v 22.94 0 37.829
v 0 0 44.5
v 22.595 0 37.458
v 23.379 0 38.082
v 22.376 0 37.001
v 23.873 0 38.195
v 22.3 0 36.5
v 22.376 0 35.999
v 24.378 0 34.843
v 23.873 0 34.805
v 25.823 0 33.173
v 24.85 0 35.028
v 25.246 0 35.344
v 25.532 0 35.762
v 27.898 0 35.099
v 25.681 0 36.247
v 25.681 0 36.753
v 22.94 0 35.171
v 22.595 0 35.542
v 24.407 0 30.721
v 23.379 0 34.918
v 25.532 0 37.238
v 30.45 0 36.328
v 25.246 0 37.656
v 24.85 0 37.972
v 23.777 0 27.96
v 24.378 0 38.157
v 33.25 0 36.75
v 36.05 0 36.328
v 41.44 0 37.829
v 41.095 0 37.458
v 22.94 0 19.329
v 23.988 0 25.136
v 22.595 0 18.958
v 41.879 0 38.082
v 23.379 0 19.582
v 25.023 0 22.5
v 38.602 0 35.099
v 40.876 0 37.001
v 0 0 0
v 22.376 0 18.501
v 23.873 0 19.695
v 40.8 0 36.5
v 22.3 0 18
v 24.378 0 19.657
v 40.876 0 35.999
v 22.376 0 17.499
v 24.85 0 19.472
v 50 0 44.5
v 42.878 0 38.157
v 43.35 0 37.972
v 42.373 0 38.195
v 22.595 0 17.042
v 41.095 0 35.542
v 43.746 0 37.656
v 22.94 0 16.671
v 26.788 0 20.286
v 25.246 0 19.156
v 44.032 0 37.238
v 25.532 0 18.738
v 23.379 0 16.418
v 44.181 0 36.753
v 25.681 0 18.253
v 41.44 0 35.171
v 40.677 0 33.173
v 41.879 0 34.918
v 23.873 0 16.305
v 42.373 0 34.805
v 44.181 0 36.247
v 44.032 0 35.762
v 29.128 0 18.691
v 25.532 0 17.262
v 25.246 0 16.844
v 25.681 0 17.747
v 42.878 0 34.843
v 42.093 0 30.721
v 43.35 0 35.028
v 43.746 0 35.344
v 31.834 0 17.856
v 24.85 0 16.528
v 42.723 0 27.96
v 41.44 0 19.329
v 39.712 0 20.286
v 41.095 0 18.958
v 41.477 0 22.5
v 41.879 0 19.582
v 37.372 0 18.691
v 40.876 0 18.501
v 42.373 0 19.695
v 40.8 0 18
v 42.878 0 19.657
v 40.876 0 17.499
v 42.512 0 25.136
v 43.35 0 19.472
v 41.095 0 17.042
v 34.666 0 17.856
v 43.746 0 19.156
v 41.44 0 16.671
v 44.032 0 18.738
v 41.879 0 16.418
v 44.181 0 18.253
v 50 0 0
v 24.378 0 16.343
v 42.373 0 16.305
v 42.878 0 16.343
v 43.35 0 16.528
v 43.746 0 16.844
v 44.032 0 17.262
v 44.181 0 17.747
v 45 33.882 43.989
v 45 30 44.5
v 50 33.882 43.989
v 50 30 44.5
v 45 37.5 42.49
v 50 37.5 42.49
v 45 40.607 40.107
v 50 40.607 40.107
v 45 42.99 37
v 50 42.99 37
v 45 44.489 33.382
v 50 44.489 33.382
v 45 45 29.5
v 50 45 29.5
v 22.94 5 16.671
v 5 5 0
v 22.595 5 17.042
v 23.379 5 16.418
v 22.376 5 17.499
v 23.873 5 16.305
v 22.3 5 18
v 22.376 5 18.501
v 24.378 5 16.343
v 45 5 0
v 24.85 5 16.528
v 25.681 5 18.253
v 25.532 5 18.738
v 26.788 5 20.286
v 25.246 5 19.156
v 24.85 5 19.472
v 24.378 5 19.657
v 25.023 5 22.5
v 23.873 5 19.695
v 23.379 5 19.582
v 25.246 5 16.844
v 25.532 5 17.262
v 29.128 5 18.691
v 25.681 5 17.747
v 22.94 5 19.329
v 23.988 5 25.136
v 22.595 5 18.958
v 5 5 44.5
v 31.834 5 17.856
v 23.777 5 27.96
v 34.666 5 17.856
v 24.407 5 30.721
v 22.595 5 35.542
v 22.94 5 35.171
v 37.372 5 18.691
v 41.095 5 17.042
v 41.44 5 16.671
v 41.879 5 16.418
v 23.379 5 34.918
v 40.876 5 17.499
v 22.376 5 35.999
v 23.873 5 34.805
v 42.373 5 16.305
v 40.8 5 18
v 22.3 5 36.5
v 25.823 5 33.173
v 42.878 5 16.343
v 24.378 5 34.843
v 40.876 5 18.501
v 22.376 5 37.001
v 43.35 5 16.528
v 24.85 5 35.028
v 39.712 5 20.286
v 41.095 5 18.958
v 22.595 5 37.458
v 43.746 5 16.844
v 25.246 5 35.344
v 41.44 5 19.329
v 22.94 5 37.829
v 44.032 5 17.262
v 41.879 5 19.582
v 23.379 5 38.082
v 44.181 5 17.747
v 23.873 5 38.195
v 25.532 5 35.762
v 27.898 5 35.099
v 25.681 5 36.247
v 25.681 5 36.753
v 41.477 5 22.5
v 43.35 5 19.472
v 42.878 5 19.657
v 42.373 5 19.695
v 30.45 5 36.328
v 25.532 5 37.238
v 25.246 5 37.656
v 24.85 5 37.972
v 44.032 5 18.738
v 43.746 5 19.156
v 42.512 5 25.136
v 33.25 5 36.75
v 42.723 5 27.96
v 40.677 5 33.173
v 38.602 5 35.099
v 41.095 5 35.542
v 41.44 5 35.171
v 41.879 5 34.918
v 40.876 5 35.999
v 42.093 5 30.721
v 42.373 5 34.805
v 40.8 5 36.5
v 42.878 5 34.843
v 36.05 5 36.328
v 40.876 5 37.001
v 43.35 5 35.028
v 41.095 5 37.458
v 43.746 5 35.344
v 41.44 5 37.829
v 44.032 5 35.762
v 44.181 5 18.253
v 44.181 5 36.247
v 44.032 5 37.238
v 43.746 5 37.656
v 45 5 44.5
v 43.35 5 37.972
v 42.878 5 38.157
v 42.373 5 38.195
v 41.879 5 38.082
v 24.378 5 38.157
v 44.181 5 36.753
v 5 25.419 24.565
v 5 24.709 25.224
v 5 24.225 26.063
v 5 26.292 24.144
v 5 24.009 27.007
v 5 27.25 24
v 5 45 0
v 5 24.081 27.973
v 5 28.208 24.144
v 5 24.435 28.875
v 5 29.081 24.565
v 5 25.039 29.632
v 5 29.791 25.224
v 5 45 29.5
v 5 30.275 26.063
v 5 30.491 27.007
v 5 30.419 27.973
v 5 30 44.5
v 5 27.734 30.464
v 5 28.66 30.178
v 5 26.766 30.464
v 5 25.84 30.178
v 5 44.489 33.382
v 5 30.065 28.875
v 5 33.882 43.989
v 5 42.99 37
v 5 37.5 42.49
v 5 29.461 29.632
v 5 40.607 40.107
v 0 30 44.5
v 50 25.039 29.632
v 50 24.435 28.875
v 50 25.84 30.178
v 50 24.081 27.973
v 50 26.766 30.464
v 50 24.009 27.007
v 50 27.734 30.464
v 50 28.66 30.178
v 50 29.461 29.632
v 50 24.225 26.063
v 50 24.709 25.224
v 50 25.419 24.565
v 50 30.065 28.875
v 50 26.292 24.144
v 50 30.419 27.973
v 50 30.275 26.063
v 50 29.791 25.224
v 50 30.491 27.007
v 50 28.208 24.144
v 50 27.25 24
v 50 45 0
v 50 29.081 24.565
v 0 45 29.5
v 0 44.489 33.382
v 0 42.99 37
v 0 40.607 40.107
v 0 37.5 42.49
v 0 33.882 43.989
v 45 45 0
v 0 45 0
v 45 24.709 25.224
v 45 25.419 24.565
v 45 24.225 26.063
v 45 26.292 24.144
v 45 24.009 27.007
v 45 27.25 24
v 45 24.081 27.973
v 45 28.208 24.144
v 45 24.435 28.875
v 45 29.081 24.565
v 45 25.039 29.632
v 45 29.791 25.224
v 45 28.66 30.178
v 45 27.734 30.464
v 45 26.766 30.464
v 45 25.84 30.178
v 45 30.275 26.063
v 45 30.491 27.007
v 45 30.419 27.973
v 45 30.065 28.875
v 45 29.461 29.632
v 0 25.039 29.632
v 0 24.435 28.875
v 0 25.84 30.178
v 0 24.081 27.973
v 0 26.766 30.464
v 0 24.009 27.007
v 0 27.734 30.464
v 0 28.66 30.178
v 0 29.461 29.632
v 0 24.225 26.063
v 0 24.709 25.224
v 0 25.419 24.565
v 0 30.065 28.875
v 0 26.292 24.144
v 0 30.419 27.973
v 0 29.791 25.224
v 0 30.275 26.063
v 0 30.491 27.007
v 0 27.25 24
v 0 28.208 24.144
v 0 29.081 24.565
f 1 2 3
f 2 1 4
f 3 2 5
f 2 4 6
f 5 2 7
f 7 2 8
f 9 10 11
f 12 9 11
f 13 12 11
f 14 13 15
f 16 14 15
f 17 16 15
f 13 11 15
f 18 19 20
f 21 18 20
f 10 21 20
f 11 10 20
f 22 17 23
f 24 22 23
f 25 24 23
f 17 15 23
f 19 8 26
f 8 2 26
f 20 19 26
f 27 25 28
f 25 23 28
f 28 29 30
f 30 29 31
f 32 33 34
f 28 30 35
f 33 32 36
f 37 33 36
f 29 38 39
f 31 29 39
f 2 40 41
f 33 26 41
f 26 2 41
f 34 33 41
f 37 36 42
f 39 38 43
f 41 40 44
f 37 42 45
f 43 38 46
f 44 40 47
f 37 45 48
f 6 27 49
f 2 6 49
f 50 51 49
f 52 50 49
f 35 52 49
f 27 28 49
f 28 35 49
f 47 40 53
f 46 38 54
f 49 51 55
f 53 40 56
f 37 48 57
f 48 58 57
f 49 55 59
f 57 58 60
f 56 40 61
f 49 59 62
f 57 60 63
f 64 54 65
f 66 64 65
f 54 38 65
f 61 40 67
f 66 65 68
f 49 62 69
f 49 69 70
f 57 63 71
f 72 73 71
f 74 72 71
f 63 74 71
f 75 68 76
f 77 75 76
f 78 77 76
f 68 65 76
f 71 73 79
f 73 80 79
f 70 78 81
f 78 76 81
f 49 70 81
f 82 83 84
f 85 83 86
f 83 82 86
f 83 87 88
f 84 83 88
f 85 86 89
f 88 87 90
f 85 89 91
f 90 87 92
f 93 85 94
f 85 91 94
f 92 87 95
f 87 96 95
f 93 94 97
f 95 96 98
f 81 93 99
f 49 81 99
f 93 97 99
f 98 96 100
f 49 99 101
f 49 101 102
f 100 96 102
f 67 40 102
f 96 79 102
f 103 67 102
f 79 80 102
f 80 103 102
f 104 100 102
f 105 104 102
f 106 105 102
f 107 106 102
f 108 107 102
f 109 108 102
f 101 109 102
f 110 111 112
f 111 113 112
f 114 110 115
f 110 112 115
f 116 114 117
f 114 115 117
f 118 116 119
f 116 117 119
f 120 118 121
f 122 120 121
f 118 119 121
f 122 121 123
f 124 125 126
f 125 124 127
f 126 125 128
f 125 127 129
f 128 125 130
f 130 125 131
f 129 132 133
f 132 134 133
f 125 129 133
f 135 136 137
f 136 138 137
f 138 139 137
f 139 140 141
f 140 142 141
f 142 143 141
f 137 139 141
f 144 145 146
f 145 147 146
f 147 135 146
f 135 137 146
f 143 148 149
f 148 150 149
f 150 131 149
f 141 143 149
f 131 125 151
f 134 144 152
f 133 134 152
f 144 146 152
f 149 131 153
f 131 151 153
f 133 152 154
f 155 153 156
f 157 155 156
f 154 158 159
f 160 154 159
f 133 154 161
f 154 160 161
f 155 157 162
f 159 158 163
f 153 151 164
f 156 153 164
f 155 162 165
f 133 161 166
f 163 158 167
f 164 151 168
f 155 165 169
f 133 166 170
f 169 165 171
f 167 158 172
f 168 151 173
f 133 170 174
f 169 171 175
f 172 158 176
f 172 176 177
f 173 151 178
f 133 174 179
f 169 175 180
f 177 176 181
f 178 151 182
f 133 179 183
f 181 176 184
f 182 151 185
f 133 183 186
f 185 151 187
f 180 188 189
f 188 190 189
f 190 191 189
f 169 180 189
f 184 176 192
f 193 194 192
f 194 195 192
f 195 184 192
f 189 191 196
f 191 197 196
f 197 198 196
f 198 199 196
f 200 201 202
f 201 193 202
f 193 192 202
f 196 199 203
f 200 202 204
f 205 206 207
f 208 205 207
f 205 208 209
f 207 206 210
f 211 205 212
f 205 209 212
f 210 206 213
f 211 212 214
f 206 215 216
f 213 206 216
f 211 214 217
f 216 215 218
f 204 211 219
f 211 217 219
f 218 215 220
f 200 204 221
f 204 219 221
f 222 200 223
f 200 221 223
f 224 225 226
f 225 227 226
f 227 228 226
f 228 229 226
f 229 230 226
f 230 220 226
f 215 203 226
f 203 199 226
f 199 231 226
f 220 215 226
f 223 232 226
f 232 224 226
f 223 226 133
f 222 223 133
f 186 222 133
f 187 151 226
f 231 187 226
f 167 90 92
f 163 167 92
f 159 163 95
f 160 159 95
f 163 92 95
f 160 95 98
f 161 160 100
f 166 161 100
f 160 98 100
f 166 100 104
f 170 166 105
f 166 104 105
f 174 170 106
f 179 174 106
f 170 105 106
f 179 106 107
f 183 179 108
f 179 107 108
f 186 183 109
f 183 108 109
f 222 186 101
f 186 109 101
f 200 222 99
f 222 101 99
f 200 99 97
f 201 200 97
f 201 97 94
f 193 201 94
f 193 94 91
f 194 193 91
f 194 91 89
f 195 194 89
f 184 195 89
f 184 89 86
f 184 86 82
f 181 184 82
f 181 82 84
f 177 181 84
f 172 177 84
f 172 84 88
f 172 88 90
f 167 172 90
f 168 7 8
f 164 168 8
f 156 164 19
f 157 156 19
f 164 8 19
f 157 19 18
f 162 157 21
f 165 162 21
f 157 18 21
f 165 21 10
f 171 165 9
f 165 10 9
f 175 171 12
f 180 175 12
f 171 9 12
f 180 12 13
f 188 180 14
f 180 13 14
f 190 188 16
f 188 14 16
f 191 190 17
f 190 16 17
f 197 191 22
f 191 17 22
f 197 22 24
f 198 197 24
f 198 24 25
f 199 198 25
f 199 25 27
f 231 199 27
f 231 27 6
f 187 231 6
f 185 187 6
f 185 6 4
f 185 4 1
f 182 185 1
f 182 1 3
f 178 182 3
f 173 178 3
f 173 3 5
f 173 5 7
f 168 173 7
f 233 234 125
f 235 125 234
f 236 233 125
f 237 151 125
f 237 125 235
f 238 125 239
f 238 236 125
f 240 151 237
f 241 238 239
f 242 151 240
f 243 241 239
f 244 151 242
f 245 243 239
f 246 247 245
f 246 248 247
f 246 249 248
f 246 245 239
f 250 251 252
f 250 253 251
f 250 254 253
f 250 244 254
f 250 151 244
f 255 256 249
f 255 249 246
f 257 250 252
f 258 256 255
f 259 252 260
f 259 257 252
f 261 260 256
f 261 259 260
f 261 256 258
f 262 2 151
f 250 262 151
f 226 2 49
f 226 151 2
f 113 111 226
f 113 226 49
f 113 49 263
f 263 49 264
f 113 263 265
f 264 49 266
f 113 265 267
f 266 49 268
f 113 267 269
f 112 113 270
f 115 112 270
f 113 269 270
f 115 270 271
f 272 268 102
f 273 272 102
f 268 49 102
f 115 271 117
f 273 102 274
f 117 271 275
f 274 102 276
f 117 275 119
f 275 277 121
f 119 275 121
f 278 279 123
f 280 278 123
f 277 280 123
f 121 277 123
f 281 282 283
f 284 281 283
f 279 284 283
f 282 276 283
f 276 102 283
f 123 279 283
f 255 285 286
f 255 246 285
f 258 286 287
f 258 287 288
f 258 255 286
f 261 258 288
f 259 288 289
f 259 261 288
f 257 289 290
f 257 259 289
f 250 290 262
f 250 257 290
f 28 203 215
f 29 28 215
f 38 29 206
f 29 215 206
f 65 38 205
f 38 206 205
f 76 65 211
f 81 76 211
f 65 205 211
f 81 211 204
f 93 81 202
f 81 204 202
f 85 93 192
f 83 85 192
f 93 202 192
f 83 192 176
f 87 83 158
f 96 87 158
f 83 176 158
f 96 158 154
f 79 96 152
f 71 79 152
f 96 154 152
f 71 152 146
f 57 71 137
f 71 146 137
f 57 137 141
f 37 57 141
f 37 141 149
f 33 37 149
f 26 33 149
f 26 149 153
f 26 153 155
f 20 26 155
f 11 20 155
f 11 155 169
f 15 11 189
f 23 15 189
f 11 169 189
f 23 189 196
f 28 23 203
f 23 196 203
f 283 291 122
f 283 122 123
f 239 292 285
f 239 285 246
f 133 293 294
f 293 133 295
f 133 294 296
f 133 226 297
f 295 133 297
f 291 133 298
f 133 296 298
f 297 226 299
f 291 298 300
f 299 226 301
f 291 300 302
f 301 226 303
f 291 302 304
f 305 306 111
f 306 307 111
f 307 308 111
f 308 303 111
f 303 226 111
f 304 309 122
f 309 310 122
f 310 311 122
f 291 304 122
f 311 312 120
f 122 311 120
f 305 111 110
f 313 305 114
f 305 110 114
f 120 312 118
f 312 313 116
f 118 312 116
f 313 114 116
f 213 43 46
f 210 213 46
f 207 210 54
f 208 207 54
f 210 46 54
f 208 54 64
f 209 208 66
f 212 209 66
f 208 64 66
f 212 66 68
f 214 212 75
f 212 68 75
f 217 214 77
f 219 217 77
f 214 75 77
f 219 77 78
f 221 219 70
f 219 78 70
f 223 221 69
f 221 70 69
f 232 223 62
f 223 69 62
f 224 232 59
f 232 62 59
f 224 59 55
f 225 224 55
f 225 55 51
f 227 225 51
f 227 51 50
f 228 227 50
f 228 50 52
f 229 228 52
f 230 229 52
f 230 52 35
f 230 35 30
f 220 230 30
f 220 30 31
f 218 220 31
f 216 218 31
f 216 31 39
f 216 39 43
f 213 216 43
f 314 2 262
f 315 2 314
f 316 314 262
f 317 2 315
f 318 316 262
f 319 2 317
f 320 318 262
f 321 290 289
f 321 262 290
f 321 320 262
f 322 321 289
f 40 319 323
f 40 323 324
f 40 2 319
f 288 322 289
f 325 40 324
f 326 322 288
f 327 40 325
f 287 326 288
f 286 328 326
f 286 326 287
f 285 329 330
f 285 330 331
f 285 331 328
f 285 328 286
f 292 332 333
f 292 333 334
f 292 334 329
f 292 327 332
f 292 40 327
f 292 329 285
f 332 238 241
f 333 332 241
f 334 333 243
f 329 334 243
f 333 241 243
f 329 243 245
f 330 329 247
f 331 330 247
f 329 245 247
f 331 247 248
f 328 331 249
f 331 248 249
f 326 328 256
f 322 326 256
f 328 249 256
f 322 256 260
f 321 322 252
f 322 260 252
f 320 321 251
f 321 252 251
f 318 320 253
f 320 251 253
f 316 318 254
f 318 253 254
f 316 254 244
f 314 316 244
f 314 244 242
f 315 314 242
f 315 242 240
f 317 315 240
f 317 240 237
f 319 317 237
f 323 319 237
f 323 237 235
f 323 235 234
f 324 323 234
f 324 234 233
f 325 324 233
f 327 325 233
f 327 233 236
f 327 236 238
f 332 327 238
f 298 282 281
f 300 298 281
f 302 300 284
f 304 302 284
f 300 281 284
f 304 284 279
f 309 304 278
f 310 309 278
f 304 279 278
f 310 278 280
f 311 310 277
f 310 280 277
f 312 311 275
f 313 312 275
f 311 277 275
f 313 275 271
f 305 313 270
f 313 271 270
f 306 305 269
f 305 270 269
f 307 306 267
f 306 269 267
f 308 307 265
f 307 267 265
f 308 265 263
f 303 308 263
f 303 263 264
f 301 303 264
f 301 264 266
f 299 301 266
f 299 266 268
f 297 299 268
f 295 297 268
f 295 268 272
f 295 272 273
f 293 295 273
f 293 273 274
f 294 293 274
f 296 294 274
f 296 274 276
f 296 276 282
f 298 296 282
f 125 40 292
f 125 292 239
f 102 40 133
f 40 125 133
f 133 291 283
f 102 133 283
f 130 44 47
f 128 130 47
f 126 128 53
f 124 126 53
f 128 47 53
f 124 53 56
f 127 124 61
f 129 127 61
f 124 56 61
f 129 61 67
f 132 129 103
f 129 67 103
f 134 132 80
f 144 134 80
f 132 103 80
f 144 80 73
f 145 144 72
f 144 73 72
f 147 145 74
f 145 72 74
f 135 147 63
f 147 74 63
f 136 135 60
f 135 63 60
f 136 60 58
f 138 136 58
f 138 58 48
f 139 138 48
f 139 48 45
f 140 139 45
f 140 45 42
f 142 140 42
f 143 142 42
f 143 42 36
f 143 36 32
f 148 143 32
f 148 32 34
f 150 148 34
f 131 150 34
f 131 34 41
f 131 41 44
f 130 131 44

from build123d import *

# Parameters (mm, degrees)
ESQUISSE1_W             = 50
ESQUISSE1_H             = 45
BOSS_EXTRU_1_DEPTH      = 44.5
ESQUISSE2_W             = 40
ESQUISSE2_H             = 40
ENL_V_MAT_EXTRU_1_DEPTH = 44.5
ESQUISSE3_R             = 9.5
ESQUISSE3_R_2           = 1.5
ENL_V_MAT_EXTRU_2_DEPTH = 5
D_GAGEMENT_M31_D        = 3.4
CONG_1_R                = 15
ENL_V_MAT_EXTRU_3_REACH = 82.655
ESQUISSE7_R             = 3.25


with BuildPart() as part:
    # Esquisse1 → Boss.-Extru.1 (new body)
    with BuildSketch(Plane.XY):
        with Locations((25, 22.5)):
            Rectangle(ESQUISSE1_W, ESQUISSE1_H)
    extrude(amount=BOSS_EXTRU_1_DEPTH)

    # Esquisse2 → Enlèv. mat.-Extru.1 (cut)
    with BuildSketch(Plane.XY.offset(44.5)):
        with Locations((25, 25)):
            Rectangle(ESQUISSE2_W, ESQUISSE2_H)
    extrude(amount=-ENL_V_MAT_EXTRU_1_DEPTH, mode=Mode.SUBTRACT)

    # Esquisse3 → Enlèv. mat.-Extru.2 (cut)
    with BuildSketch(Plane(origin=(0, 5, 0), x_dir=(1, 0, 0), z_dir=(0, 1, 0))):
        with Locations(Location((33.25, -27.25, 0), (0, 0, 270))):
            Circle(ESQUISSE3_R)
        with Locations(Location((42.5, -18, 0), (0, 0, 270))):
            Circle(ESQUISSE3_R_2)
        with Locations(Location((24, -18, 0), (0, 0, 270))):
            Circle(ESQUISSE3_R_2)
        with Locations(Location((24, -36.5, 0), (0, 0, 270))):
            Circle(ESQUISSE3_R_2)
        with Locations(Location((42.5, -36.5, 0), (0, 0, 270))):
            Circle(ESQUISSE3_R_2)
    extrude(amount=-ENL_V_MAT_EXTRU_2_DEPTH, mode=Mode.SUBTRACT)

    # Dégagement M31 (through all)
    with Locations(Plane(origin=(0, 5, 0), x_dir=(1, 0, 0), z_dir=(0, 1, 0))):
        with Locations((42.5, -18), (24, -18), (24, -36.5), (42.5, -36.5)):
            Hole(D_GAGEMENT_M31_D / 2)

    # Congé1
    cong_1_edges = [part.edges().sort_by_distance(p)[0] for p in [
        (2.5, 45, 44.5),
        (47.5, 45, 44.5),
    ]]
    fillet(cong_1_edges, radius=CONG_1_R)

    # Enlèv. mat.-Extru.3: up to this face of the body (flat: up to its plane)
    enl_v_mat_extru_3_end = Plane(part.part.faces().sort_by_distance((0, 22.02684797, 21.783025057))[0])
    # Esquisse7 → Enlèv. mat.-Extru.3 (cut, up to the picked face)
    with BuildSketch(Plane(origin=(50, 0, 0), x_dir=(0, 0, -1), z_dir=(1, 0, 0)), mode=Mode.PRIVATE) as enl_v_mat_extru_3_sk1:
        with Locations((-27.25, 27.25)):
            Circle(ESQUISSE7_R)
    enl_v_mat_extru_3_tool1 = split(extrude(enl_v_mat_extru_3_sk1.sketch, amount=-ENL_V_MAT_EXTRU_3_REACH, mode=Mode.PRIVATE), bisect_by=enl_v_mat_extru_3_end, keep=Keep.BOTH, mode=Mode.PRIVATE)
    add(enl_v_mat_extru_3_tool1.solids().sort_by(Axis((50, 27.25, 27.25), (-1, 0, 0)))[0], mode=Mode.SUBTRACT)


solid = part.part
